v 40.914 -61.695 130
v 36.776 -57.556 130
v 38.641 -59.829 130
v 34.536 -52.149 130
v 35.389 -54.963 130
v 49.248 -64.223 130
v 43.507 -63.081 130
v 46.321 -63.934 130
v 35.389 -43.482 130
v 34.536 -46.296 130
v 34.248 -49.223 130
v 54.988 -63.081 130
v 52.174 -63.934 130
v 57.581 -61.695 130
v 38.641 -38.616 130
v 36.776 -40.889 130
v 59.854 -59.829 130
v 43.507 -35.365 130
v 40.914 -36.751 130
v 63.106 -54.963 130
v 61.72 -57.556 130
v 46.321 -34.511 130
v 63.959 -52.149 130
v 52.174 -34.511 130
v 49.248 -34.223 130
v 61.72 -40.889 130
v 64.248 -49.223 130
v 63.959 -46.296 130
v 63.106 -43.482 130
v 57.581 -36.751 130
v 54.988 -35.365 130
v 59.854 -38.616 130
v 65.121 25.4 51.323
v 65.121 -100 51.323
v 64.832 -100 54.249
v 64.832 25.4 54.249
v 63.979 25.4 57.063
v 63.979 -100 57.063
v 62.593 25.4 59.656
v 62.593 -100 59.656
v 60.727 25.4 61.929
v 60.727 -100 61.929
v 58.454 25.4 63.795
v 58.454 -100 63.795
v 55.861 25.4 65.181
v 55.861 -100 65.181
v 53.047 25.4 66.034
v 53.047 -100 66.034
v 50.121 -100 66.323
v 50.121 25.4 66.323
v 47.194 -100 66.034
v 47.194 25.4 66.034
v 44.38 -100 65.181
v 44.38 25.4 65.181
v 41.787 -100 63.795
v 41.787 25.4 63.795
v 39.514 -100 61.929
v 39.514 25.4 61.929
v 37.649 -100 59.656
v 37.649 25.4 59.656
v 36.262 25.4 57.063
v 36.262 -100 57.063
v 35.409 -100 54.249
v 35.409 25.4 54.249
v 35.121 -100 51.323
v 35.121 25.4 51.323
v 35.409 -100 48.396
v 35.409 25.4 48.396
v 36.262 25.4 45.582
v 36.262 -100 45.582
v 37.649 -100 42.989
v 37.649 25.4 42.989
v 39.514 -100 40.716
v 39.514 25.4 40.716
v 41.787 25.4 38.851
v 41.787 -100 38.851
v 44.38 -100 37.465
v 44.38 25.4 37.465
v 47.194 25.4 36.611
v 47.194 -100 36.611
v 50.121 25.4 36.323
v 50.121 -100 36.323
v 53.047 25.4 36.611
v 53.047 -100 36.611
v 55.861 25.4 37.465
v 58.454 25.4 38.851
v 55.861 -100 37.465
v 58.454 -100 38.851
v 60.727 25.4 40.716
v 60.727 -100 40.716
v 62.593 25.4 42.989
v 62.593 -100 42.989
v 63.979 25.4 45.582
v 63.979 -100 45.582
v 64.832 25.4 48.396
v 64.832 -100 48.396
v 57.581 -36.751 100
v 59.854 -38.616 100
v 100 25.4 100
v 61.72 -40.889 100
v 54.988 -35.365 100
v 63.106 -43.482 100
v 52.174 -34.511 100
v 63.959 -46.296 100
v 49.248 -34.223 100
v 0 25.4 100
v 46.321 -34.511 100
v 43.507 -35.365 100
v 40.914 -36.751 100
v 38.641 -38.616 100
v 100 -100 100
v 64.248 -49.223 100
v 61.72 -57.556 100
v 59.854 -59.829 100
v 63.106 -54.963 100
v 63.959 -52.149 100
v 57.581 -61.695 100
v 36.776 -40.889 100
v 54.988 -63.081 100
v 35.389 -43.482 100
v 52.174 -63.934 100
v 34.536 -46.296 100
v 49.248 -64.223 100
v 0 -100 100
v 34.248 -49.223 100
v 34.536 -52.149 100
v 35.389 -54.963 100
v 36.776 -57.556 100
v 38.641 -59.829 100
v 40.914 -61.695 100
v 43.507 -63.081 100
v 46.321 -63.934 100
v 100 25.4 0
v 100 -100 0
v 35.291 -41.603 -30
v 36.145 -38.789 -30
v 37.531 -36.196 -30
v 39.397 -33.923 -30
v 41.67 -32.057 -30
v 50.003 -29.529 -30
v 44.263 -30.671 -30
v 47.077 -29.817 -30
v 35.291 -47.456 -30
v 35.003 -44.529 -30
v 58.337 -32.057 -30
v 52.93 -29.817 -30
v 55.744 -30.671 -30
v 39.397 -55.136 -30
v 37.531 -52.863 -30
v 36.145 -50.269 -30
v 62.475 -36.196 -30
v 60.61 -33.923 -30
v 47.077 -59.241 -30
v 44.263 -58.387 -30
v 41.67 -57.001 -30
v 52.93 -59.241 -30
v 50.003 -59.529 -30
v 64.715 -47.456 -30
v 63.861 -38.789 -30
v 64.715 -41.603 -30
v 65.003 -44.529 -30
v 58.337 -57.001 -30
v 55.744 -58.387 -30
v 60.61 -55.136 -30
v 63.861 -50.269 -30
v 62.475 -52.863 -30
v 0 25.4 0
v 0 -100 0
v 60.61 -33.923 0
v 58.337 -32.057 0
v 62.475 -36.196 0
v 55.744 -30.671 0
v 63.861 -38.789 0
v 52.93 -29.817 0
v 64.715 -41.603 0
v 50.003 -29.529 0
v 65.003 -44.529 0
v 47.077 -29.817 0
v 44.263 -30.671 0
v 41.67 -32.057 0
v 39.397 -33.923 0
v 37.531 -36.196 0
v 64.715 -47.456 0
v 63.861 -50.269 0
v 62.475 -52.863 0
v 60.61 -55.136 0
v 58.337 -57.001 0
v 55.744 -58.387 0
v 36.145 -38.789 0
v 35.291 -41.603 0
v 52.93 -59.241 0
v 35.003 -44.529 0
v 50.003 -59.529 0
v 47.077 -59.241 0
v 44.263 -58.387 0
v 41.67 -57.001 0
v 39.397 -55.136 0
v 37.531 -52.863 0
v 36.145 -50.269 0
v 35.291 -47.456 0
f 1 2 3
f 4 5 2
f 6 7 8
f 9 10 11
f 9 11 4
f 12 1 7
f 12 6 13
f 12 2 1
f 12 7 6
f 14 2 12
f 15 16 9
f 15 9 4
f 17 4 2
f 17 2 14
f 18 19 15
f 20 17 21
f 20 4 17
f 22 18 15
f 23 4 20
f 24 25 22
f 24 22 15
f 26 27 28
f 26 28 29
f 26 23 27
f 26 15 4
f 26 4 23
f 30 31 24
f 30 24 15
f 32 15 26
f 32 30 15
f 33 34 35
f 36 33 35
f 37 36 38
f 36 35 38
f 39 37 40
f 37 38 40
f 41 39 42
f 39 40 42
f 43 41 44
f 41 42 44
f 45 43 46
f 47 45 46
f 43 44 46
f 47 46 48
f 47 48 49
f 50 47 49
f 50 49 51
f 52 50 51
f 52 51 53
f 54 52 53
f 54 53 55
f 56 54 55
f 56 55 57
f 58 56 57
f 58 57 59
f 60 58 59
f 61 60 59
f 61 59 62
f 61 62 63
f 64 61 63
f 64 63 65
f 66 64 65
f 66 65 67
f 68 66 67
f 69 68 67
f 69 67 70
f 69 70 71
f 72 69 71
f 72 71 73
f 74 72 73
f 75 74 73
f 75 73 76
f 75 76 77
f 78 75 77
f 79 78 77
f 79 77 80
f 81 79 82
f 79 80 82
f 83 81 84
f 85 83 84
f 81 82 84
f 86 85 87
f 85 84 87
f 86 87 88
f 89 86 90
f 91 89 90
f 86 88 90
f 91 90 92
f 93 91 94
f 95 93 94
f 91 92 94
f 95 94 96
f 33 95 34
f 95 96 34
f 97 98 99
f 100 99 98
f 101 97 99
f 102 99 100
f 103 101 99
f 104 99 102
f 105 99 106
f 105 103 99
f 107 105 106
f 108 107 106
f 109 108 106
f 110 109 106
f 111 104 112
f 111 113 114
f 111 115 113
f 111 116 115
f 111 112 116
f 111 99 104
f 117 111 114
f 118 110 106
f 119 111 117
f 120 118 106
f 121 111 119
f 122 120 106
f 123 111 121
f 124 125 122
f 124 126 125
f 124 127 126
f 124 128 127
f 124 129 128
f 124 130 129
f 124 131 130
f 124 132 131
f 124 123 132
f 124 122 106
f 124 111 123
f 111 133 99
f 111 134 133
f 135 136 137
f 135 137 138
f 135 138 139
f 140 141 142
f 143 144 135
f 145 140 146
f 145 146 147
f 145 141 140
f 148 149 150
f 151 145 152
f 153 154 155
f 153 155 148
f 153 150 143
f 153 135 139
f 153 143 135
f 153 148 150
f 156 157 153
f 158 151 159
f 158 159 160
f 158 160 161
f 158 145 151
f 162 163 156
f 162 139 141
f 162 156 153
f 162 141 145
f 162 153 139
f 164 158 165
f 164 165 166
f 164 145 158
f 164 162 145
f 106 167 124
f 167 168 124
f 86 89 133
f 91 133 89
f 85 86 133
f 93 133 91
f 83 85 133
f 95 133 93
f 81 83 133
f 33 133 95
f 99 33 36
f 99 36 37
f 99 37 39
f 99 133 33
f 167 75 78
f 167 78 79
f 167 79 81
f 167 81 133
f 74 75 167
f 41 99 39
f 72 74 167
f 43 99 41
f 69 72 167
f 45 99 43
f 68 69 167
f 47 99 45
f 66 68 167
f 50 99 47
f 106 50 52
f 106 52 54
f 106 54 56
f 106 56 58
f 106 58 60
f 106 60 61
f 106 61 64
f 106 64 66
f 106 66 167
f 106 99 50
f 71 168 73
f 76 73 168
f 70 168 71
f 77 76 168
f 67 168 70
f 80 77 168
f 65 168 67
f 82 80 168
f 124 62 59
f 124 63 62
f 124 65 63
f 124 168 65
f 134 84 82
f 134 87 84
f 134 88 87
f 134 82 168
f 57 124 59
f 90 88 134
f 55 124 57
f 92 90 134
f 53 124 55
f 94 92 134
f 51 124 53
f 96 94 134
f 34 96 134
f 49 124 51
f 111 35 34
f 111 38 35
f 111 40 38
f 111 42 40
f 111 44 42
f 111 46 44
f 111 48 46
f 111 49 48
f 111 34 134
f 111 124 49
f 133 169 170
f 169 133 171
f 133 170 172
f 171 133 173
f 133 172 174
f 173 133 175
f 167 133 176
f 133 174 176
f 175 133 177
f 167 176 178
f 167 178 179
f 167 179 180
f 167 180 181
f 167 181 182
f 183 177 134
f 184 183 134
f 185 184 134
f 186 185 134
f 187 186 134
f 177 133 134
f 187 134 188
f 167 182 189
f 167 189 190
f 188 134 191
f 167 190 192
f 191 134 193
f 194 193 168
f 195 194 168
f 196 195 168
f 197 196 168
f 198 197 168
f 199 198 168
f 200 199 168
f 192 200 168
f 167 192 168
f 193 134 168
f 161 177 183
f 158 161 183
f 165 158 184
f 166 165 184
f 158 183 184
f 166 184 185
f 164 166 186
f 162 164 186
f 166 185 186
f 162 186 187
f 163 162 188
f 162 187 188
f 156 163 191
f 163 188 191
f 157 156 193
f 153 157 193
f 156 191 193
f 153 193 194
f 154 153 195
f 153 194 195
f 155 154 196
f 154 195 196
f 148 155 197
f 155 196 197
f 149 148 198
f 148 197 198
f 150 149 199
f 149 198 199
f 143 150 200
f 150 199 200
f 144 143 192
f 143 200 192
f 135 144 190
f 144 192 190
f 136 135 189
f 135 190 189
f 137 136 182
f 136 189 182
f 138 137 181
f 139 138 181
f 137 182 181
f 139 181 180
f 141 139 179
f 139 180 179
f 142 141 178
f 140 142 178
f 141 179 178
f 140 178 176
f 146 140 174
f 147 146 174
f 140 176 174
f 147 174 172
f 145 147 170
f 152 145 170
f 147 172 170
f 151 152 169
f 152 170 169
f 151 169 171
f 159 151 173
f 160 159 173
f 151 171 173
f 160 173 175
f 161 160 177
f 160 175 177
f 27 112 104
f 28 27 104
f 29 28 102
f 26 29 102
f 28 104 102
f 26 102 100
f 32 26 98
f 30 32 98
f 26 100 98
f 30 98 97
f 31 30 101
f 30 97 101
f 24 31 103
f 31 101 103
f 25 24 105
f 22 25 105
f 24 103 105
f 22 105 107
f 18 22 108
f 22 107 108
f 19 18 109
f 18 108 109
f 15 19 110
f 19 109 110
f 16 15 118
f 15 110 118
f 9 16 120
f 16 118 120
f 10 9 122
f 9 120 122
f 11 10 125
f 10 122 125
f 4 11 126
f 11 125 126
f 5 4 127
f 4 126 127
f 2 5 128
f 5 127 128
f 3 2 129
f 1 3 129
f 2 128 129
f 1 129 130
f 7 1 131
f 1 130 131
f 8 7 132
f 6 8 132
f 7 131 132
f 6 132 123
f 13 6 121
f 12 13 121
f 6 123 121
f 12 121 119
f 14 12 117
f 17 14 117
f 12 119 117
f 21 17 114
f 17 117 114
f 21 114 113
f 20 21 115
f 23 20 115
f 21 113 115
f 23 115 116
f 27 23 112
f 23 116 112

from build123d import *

# Parameters (mm, degrees)
F0_W     = 100
F0_H     = 100
F1_DEPTH = 100
F3_R     = 15
F4_DEPTH = 30
F2_R     = 15
F5_DEPTH = 30
F6_W     = 100
F6_H     = 100
F7_DEPTH = 25.4
F9_D     = 30


with BuildPart() as f1:
    # F0 (on Front) → F1 (new body)
    with BuildSketch(Plane.XZ):
        with Locations((50, 50)):
            Rectangle(F0_W, F0_H)
    extrude(amount=F1_DEPTH)

    # F3 (on face) → F4 (join)
    with BuildSketch(Plane(origin=(0, 0, 0), x_dir=(1, 0, 0), z_dir=(0, 0, -1))):
        with Locations((50.003275, 44.529211)):
            Circle(F3_R)
    extrude(amount=F4_DEPTH)

    # F2 (on face) → F5 (join)
    with BuildSketch(Plane.XY.offset(100)):
        with Locations((49.247686, -49.222711)):
            Circle(F2_R)
    extrude(amount=F5_DEPTH)

    # F6 (on face) → F7 (join)
    with BuildSketch(Plane(origin=(0, 0, 0), x_dir=(-1, 0, 0), z_dir=(0, 1, 0))):
        with Locations((-50, 50)):
            Rectangle(F6_W, F6_H)
    extrude(amount=F7_DEPTH)

    # F9 (through all)
    with Locations(Plane(origin=(0, 25.4, 0), x_dir=(-1, 0, 0), z_dir=(0, 1, 0))):
        with Locations((-50.120577, 51.322706)):
            Hole(F9_D / 2)


solid = f1.part
